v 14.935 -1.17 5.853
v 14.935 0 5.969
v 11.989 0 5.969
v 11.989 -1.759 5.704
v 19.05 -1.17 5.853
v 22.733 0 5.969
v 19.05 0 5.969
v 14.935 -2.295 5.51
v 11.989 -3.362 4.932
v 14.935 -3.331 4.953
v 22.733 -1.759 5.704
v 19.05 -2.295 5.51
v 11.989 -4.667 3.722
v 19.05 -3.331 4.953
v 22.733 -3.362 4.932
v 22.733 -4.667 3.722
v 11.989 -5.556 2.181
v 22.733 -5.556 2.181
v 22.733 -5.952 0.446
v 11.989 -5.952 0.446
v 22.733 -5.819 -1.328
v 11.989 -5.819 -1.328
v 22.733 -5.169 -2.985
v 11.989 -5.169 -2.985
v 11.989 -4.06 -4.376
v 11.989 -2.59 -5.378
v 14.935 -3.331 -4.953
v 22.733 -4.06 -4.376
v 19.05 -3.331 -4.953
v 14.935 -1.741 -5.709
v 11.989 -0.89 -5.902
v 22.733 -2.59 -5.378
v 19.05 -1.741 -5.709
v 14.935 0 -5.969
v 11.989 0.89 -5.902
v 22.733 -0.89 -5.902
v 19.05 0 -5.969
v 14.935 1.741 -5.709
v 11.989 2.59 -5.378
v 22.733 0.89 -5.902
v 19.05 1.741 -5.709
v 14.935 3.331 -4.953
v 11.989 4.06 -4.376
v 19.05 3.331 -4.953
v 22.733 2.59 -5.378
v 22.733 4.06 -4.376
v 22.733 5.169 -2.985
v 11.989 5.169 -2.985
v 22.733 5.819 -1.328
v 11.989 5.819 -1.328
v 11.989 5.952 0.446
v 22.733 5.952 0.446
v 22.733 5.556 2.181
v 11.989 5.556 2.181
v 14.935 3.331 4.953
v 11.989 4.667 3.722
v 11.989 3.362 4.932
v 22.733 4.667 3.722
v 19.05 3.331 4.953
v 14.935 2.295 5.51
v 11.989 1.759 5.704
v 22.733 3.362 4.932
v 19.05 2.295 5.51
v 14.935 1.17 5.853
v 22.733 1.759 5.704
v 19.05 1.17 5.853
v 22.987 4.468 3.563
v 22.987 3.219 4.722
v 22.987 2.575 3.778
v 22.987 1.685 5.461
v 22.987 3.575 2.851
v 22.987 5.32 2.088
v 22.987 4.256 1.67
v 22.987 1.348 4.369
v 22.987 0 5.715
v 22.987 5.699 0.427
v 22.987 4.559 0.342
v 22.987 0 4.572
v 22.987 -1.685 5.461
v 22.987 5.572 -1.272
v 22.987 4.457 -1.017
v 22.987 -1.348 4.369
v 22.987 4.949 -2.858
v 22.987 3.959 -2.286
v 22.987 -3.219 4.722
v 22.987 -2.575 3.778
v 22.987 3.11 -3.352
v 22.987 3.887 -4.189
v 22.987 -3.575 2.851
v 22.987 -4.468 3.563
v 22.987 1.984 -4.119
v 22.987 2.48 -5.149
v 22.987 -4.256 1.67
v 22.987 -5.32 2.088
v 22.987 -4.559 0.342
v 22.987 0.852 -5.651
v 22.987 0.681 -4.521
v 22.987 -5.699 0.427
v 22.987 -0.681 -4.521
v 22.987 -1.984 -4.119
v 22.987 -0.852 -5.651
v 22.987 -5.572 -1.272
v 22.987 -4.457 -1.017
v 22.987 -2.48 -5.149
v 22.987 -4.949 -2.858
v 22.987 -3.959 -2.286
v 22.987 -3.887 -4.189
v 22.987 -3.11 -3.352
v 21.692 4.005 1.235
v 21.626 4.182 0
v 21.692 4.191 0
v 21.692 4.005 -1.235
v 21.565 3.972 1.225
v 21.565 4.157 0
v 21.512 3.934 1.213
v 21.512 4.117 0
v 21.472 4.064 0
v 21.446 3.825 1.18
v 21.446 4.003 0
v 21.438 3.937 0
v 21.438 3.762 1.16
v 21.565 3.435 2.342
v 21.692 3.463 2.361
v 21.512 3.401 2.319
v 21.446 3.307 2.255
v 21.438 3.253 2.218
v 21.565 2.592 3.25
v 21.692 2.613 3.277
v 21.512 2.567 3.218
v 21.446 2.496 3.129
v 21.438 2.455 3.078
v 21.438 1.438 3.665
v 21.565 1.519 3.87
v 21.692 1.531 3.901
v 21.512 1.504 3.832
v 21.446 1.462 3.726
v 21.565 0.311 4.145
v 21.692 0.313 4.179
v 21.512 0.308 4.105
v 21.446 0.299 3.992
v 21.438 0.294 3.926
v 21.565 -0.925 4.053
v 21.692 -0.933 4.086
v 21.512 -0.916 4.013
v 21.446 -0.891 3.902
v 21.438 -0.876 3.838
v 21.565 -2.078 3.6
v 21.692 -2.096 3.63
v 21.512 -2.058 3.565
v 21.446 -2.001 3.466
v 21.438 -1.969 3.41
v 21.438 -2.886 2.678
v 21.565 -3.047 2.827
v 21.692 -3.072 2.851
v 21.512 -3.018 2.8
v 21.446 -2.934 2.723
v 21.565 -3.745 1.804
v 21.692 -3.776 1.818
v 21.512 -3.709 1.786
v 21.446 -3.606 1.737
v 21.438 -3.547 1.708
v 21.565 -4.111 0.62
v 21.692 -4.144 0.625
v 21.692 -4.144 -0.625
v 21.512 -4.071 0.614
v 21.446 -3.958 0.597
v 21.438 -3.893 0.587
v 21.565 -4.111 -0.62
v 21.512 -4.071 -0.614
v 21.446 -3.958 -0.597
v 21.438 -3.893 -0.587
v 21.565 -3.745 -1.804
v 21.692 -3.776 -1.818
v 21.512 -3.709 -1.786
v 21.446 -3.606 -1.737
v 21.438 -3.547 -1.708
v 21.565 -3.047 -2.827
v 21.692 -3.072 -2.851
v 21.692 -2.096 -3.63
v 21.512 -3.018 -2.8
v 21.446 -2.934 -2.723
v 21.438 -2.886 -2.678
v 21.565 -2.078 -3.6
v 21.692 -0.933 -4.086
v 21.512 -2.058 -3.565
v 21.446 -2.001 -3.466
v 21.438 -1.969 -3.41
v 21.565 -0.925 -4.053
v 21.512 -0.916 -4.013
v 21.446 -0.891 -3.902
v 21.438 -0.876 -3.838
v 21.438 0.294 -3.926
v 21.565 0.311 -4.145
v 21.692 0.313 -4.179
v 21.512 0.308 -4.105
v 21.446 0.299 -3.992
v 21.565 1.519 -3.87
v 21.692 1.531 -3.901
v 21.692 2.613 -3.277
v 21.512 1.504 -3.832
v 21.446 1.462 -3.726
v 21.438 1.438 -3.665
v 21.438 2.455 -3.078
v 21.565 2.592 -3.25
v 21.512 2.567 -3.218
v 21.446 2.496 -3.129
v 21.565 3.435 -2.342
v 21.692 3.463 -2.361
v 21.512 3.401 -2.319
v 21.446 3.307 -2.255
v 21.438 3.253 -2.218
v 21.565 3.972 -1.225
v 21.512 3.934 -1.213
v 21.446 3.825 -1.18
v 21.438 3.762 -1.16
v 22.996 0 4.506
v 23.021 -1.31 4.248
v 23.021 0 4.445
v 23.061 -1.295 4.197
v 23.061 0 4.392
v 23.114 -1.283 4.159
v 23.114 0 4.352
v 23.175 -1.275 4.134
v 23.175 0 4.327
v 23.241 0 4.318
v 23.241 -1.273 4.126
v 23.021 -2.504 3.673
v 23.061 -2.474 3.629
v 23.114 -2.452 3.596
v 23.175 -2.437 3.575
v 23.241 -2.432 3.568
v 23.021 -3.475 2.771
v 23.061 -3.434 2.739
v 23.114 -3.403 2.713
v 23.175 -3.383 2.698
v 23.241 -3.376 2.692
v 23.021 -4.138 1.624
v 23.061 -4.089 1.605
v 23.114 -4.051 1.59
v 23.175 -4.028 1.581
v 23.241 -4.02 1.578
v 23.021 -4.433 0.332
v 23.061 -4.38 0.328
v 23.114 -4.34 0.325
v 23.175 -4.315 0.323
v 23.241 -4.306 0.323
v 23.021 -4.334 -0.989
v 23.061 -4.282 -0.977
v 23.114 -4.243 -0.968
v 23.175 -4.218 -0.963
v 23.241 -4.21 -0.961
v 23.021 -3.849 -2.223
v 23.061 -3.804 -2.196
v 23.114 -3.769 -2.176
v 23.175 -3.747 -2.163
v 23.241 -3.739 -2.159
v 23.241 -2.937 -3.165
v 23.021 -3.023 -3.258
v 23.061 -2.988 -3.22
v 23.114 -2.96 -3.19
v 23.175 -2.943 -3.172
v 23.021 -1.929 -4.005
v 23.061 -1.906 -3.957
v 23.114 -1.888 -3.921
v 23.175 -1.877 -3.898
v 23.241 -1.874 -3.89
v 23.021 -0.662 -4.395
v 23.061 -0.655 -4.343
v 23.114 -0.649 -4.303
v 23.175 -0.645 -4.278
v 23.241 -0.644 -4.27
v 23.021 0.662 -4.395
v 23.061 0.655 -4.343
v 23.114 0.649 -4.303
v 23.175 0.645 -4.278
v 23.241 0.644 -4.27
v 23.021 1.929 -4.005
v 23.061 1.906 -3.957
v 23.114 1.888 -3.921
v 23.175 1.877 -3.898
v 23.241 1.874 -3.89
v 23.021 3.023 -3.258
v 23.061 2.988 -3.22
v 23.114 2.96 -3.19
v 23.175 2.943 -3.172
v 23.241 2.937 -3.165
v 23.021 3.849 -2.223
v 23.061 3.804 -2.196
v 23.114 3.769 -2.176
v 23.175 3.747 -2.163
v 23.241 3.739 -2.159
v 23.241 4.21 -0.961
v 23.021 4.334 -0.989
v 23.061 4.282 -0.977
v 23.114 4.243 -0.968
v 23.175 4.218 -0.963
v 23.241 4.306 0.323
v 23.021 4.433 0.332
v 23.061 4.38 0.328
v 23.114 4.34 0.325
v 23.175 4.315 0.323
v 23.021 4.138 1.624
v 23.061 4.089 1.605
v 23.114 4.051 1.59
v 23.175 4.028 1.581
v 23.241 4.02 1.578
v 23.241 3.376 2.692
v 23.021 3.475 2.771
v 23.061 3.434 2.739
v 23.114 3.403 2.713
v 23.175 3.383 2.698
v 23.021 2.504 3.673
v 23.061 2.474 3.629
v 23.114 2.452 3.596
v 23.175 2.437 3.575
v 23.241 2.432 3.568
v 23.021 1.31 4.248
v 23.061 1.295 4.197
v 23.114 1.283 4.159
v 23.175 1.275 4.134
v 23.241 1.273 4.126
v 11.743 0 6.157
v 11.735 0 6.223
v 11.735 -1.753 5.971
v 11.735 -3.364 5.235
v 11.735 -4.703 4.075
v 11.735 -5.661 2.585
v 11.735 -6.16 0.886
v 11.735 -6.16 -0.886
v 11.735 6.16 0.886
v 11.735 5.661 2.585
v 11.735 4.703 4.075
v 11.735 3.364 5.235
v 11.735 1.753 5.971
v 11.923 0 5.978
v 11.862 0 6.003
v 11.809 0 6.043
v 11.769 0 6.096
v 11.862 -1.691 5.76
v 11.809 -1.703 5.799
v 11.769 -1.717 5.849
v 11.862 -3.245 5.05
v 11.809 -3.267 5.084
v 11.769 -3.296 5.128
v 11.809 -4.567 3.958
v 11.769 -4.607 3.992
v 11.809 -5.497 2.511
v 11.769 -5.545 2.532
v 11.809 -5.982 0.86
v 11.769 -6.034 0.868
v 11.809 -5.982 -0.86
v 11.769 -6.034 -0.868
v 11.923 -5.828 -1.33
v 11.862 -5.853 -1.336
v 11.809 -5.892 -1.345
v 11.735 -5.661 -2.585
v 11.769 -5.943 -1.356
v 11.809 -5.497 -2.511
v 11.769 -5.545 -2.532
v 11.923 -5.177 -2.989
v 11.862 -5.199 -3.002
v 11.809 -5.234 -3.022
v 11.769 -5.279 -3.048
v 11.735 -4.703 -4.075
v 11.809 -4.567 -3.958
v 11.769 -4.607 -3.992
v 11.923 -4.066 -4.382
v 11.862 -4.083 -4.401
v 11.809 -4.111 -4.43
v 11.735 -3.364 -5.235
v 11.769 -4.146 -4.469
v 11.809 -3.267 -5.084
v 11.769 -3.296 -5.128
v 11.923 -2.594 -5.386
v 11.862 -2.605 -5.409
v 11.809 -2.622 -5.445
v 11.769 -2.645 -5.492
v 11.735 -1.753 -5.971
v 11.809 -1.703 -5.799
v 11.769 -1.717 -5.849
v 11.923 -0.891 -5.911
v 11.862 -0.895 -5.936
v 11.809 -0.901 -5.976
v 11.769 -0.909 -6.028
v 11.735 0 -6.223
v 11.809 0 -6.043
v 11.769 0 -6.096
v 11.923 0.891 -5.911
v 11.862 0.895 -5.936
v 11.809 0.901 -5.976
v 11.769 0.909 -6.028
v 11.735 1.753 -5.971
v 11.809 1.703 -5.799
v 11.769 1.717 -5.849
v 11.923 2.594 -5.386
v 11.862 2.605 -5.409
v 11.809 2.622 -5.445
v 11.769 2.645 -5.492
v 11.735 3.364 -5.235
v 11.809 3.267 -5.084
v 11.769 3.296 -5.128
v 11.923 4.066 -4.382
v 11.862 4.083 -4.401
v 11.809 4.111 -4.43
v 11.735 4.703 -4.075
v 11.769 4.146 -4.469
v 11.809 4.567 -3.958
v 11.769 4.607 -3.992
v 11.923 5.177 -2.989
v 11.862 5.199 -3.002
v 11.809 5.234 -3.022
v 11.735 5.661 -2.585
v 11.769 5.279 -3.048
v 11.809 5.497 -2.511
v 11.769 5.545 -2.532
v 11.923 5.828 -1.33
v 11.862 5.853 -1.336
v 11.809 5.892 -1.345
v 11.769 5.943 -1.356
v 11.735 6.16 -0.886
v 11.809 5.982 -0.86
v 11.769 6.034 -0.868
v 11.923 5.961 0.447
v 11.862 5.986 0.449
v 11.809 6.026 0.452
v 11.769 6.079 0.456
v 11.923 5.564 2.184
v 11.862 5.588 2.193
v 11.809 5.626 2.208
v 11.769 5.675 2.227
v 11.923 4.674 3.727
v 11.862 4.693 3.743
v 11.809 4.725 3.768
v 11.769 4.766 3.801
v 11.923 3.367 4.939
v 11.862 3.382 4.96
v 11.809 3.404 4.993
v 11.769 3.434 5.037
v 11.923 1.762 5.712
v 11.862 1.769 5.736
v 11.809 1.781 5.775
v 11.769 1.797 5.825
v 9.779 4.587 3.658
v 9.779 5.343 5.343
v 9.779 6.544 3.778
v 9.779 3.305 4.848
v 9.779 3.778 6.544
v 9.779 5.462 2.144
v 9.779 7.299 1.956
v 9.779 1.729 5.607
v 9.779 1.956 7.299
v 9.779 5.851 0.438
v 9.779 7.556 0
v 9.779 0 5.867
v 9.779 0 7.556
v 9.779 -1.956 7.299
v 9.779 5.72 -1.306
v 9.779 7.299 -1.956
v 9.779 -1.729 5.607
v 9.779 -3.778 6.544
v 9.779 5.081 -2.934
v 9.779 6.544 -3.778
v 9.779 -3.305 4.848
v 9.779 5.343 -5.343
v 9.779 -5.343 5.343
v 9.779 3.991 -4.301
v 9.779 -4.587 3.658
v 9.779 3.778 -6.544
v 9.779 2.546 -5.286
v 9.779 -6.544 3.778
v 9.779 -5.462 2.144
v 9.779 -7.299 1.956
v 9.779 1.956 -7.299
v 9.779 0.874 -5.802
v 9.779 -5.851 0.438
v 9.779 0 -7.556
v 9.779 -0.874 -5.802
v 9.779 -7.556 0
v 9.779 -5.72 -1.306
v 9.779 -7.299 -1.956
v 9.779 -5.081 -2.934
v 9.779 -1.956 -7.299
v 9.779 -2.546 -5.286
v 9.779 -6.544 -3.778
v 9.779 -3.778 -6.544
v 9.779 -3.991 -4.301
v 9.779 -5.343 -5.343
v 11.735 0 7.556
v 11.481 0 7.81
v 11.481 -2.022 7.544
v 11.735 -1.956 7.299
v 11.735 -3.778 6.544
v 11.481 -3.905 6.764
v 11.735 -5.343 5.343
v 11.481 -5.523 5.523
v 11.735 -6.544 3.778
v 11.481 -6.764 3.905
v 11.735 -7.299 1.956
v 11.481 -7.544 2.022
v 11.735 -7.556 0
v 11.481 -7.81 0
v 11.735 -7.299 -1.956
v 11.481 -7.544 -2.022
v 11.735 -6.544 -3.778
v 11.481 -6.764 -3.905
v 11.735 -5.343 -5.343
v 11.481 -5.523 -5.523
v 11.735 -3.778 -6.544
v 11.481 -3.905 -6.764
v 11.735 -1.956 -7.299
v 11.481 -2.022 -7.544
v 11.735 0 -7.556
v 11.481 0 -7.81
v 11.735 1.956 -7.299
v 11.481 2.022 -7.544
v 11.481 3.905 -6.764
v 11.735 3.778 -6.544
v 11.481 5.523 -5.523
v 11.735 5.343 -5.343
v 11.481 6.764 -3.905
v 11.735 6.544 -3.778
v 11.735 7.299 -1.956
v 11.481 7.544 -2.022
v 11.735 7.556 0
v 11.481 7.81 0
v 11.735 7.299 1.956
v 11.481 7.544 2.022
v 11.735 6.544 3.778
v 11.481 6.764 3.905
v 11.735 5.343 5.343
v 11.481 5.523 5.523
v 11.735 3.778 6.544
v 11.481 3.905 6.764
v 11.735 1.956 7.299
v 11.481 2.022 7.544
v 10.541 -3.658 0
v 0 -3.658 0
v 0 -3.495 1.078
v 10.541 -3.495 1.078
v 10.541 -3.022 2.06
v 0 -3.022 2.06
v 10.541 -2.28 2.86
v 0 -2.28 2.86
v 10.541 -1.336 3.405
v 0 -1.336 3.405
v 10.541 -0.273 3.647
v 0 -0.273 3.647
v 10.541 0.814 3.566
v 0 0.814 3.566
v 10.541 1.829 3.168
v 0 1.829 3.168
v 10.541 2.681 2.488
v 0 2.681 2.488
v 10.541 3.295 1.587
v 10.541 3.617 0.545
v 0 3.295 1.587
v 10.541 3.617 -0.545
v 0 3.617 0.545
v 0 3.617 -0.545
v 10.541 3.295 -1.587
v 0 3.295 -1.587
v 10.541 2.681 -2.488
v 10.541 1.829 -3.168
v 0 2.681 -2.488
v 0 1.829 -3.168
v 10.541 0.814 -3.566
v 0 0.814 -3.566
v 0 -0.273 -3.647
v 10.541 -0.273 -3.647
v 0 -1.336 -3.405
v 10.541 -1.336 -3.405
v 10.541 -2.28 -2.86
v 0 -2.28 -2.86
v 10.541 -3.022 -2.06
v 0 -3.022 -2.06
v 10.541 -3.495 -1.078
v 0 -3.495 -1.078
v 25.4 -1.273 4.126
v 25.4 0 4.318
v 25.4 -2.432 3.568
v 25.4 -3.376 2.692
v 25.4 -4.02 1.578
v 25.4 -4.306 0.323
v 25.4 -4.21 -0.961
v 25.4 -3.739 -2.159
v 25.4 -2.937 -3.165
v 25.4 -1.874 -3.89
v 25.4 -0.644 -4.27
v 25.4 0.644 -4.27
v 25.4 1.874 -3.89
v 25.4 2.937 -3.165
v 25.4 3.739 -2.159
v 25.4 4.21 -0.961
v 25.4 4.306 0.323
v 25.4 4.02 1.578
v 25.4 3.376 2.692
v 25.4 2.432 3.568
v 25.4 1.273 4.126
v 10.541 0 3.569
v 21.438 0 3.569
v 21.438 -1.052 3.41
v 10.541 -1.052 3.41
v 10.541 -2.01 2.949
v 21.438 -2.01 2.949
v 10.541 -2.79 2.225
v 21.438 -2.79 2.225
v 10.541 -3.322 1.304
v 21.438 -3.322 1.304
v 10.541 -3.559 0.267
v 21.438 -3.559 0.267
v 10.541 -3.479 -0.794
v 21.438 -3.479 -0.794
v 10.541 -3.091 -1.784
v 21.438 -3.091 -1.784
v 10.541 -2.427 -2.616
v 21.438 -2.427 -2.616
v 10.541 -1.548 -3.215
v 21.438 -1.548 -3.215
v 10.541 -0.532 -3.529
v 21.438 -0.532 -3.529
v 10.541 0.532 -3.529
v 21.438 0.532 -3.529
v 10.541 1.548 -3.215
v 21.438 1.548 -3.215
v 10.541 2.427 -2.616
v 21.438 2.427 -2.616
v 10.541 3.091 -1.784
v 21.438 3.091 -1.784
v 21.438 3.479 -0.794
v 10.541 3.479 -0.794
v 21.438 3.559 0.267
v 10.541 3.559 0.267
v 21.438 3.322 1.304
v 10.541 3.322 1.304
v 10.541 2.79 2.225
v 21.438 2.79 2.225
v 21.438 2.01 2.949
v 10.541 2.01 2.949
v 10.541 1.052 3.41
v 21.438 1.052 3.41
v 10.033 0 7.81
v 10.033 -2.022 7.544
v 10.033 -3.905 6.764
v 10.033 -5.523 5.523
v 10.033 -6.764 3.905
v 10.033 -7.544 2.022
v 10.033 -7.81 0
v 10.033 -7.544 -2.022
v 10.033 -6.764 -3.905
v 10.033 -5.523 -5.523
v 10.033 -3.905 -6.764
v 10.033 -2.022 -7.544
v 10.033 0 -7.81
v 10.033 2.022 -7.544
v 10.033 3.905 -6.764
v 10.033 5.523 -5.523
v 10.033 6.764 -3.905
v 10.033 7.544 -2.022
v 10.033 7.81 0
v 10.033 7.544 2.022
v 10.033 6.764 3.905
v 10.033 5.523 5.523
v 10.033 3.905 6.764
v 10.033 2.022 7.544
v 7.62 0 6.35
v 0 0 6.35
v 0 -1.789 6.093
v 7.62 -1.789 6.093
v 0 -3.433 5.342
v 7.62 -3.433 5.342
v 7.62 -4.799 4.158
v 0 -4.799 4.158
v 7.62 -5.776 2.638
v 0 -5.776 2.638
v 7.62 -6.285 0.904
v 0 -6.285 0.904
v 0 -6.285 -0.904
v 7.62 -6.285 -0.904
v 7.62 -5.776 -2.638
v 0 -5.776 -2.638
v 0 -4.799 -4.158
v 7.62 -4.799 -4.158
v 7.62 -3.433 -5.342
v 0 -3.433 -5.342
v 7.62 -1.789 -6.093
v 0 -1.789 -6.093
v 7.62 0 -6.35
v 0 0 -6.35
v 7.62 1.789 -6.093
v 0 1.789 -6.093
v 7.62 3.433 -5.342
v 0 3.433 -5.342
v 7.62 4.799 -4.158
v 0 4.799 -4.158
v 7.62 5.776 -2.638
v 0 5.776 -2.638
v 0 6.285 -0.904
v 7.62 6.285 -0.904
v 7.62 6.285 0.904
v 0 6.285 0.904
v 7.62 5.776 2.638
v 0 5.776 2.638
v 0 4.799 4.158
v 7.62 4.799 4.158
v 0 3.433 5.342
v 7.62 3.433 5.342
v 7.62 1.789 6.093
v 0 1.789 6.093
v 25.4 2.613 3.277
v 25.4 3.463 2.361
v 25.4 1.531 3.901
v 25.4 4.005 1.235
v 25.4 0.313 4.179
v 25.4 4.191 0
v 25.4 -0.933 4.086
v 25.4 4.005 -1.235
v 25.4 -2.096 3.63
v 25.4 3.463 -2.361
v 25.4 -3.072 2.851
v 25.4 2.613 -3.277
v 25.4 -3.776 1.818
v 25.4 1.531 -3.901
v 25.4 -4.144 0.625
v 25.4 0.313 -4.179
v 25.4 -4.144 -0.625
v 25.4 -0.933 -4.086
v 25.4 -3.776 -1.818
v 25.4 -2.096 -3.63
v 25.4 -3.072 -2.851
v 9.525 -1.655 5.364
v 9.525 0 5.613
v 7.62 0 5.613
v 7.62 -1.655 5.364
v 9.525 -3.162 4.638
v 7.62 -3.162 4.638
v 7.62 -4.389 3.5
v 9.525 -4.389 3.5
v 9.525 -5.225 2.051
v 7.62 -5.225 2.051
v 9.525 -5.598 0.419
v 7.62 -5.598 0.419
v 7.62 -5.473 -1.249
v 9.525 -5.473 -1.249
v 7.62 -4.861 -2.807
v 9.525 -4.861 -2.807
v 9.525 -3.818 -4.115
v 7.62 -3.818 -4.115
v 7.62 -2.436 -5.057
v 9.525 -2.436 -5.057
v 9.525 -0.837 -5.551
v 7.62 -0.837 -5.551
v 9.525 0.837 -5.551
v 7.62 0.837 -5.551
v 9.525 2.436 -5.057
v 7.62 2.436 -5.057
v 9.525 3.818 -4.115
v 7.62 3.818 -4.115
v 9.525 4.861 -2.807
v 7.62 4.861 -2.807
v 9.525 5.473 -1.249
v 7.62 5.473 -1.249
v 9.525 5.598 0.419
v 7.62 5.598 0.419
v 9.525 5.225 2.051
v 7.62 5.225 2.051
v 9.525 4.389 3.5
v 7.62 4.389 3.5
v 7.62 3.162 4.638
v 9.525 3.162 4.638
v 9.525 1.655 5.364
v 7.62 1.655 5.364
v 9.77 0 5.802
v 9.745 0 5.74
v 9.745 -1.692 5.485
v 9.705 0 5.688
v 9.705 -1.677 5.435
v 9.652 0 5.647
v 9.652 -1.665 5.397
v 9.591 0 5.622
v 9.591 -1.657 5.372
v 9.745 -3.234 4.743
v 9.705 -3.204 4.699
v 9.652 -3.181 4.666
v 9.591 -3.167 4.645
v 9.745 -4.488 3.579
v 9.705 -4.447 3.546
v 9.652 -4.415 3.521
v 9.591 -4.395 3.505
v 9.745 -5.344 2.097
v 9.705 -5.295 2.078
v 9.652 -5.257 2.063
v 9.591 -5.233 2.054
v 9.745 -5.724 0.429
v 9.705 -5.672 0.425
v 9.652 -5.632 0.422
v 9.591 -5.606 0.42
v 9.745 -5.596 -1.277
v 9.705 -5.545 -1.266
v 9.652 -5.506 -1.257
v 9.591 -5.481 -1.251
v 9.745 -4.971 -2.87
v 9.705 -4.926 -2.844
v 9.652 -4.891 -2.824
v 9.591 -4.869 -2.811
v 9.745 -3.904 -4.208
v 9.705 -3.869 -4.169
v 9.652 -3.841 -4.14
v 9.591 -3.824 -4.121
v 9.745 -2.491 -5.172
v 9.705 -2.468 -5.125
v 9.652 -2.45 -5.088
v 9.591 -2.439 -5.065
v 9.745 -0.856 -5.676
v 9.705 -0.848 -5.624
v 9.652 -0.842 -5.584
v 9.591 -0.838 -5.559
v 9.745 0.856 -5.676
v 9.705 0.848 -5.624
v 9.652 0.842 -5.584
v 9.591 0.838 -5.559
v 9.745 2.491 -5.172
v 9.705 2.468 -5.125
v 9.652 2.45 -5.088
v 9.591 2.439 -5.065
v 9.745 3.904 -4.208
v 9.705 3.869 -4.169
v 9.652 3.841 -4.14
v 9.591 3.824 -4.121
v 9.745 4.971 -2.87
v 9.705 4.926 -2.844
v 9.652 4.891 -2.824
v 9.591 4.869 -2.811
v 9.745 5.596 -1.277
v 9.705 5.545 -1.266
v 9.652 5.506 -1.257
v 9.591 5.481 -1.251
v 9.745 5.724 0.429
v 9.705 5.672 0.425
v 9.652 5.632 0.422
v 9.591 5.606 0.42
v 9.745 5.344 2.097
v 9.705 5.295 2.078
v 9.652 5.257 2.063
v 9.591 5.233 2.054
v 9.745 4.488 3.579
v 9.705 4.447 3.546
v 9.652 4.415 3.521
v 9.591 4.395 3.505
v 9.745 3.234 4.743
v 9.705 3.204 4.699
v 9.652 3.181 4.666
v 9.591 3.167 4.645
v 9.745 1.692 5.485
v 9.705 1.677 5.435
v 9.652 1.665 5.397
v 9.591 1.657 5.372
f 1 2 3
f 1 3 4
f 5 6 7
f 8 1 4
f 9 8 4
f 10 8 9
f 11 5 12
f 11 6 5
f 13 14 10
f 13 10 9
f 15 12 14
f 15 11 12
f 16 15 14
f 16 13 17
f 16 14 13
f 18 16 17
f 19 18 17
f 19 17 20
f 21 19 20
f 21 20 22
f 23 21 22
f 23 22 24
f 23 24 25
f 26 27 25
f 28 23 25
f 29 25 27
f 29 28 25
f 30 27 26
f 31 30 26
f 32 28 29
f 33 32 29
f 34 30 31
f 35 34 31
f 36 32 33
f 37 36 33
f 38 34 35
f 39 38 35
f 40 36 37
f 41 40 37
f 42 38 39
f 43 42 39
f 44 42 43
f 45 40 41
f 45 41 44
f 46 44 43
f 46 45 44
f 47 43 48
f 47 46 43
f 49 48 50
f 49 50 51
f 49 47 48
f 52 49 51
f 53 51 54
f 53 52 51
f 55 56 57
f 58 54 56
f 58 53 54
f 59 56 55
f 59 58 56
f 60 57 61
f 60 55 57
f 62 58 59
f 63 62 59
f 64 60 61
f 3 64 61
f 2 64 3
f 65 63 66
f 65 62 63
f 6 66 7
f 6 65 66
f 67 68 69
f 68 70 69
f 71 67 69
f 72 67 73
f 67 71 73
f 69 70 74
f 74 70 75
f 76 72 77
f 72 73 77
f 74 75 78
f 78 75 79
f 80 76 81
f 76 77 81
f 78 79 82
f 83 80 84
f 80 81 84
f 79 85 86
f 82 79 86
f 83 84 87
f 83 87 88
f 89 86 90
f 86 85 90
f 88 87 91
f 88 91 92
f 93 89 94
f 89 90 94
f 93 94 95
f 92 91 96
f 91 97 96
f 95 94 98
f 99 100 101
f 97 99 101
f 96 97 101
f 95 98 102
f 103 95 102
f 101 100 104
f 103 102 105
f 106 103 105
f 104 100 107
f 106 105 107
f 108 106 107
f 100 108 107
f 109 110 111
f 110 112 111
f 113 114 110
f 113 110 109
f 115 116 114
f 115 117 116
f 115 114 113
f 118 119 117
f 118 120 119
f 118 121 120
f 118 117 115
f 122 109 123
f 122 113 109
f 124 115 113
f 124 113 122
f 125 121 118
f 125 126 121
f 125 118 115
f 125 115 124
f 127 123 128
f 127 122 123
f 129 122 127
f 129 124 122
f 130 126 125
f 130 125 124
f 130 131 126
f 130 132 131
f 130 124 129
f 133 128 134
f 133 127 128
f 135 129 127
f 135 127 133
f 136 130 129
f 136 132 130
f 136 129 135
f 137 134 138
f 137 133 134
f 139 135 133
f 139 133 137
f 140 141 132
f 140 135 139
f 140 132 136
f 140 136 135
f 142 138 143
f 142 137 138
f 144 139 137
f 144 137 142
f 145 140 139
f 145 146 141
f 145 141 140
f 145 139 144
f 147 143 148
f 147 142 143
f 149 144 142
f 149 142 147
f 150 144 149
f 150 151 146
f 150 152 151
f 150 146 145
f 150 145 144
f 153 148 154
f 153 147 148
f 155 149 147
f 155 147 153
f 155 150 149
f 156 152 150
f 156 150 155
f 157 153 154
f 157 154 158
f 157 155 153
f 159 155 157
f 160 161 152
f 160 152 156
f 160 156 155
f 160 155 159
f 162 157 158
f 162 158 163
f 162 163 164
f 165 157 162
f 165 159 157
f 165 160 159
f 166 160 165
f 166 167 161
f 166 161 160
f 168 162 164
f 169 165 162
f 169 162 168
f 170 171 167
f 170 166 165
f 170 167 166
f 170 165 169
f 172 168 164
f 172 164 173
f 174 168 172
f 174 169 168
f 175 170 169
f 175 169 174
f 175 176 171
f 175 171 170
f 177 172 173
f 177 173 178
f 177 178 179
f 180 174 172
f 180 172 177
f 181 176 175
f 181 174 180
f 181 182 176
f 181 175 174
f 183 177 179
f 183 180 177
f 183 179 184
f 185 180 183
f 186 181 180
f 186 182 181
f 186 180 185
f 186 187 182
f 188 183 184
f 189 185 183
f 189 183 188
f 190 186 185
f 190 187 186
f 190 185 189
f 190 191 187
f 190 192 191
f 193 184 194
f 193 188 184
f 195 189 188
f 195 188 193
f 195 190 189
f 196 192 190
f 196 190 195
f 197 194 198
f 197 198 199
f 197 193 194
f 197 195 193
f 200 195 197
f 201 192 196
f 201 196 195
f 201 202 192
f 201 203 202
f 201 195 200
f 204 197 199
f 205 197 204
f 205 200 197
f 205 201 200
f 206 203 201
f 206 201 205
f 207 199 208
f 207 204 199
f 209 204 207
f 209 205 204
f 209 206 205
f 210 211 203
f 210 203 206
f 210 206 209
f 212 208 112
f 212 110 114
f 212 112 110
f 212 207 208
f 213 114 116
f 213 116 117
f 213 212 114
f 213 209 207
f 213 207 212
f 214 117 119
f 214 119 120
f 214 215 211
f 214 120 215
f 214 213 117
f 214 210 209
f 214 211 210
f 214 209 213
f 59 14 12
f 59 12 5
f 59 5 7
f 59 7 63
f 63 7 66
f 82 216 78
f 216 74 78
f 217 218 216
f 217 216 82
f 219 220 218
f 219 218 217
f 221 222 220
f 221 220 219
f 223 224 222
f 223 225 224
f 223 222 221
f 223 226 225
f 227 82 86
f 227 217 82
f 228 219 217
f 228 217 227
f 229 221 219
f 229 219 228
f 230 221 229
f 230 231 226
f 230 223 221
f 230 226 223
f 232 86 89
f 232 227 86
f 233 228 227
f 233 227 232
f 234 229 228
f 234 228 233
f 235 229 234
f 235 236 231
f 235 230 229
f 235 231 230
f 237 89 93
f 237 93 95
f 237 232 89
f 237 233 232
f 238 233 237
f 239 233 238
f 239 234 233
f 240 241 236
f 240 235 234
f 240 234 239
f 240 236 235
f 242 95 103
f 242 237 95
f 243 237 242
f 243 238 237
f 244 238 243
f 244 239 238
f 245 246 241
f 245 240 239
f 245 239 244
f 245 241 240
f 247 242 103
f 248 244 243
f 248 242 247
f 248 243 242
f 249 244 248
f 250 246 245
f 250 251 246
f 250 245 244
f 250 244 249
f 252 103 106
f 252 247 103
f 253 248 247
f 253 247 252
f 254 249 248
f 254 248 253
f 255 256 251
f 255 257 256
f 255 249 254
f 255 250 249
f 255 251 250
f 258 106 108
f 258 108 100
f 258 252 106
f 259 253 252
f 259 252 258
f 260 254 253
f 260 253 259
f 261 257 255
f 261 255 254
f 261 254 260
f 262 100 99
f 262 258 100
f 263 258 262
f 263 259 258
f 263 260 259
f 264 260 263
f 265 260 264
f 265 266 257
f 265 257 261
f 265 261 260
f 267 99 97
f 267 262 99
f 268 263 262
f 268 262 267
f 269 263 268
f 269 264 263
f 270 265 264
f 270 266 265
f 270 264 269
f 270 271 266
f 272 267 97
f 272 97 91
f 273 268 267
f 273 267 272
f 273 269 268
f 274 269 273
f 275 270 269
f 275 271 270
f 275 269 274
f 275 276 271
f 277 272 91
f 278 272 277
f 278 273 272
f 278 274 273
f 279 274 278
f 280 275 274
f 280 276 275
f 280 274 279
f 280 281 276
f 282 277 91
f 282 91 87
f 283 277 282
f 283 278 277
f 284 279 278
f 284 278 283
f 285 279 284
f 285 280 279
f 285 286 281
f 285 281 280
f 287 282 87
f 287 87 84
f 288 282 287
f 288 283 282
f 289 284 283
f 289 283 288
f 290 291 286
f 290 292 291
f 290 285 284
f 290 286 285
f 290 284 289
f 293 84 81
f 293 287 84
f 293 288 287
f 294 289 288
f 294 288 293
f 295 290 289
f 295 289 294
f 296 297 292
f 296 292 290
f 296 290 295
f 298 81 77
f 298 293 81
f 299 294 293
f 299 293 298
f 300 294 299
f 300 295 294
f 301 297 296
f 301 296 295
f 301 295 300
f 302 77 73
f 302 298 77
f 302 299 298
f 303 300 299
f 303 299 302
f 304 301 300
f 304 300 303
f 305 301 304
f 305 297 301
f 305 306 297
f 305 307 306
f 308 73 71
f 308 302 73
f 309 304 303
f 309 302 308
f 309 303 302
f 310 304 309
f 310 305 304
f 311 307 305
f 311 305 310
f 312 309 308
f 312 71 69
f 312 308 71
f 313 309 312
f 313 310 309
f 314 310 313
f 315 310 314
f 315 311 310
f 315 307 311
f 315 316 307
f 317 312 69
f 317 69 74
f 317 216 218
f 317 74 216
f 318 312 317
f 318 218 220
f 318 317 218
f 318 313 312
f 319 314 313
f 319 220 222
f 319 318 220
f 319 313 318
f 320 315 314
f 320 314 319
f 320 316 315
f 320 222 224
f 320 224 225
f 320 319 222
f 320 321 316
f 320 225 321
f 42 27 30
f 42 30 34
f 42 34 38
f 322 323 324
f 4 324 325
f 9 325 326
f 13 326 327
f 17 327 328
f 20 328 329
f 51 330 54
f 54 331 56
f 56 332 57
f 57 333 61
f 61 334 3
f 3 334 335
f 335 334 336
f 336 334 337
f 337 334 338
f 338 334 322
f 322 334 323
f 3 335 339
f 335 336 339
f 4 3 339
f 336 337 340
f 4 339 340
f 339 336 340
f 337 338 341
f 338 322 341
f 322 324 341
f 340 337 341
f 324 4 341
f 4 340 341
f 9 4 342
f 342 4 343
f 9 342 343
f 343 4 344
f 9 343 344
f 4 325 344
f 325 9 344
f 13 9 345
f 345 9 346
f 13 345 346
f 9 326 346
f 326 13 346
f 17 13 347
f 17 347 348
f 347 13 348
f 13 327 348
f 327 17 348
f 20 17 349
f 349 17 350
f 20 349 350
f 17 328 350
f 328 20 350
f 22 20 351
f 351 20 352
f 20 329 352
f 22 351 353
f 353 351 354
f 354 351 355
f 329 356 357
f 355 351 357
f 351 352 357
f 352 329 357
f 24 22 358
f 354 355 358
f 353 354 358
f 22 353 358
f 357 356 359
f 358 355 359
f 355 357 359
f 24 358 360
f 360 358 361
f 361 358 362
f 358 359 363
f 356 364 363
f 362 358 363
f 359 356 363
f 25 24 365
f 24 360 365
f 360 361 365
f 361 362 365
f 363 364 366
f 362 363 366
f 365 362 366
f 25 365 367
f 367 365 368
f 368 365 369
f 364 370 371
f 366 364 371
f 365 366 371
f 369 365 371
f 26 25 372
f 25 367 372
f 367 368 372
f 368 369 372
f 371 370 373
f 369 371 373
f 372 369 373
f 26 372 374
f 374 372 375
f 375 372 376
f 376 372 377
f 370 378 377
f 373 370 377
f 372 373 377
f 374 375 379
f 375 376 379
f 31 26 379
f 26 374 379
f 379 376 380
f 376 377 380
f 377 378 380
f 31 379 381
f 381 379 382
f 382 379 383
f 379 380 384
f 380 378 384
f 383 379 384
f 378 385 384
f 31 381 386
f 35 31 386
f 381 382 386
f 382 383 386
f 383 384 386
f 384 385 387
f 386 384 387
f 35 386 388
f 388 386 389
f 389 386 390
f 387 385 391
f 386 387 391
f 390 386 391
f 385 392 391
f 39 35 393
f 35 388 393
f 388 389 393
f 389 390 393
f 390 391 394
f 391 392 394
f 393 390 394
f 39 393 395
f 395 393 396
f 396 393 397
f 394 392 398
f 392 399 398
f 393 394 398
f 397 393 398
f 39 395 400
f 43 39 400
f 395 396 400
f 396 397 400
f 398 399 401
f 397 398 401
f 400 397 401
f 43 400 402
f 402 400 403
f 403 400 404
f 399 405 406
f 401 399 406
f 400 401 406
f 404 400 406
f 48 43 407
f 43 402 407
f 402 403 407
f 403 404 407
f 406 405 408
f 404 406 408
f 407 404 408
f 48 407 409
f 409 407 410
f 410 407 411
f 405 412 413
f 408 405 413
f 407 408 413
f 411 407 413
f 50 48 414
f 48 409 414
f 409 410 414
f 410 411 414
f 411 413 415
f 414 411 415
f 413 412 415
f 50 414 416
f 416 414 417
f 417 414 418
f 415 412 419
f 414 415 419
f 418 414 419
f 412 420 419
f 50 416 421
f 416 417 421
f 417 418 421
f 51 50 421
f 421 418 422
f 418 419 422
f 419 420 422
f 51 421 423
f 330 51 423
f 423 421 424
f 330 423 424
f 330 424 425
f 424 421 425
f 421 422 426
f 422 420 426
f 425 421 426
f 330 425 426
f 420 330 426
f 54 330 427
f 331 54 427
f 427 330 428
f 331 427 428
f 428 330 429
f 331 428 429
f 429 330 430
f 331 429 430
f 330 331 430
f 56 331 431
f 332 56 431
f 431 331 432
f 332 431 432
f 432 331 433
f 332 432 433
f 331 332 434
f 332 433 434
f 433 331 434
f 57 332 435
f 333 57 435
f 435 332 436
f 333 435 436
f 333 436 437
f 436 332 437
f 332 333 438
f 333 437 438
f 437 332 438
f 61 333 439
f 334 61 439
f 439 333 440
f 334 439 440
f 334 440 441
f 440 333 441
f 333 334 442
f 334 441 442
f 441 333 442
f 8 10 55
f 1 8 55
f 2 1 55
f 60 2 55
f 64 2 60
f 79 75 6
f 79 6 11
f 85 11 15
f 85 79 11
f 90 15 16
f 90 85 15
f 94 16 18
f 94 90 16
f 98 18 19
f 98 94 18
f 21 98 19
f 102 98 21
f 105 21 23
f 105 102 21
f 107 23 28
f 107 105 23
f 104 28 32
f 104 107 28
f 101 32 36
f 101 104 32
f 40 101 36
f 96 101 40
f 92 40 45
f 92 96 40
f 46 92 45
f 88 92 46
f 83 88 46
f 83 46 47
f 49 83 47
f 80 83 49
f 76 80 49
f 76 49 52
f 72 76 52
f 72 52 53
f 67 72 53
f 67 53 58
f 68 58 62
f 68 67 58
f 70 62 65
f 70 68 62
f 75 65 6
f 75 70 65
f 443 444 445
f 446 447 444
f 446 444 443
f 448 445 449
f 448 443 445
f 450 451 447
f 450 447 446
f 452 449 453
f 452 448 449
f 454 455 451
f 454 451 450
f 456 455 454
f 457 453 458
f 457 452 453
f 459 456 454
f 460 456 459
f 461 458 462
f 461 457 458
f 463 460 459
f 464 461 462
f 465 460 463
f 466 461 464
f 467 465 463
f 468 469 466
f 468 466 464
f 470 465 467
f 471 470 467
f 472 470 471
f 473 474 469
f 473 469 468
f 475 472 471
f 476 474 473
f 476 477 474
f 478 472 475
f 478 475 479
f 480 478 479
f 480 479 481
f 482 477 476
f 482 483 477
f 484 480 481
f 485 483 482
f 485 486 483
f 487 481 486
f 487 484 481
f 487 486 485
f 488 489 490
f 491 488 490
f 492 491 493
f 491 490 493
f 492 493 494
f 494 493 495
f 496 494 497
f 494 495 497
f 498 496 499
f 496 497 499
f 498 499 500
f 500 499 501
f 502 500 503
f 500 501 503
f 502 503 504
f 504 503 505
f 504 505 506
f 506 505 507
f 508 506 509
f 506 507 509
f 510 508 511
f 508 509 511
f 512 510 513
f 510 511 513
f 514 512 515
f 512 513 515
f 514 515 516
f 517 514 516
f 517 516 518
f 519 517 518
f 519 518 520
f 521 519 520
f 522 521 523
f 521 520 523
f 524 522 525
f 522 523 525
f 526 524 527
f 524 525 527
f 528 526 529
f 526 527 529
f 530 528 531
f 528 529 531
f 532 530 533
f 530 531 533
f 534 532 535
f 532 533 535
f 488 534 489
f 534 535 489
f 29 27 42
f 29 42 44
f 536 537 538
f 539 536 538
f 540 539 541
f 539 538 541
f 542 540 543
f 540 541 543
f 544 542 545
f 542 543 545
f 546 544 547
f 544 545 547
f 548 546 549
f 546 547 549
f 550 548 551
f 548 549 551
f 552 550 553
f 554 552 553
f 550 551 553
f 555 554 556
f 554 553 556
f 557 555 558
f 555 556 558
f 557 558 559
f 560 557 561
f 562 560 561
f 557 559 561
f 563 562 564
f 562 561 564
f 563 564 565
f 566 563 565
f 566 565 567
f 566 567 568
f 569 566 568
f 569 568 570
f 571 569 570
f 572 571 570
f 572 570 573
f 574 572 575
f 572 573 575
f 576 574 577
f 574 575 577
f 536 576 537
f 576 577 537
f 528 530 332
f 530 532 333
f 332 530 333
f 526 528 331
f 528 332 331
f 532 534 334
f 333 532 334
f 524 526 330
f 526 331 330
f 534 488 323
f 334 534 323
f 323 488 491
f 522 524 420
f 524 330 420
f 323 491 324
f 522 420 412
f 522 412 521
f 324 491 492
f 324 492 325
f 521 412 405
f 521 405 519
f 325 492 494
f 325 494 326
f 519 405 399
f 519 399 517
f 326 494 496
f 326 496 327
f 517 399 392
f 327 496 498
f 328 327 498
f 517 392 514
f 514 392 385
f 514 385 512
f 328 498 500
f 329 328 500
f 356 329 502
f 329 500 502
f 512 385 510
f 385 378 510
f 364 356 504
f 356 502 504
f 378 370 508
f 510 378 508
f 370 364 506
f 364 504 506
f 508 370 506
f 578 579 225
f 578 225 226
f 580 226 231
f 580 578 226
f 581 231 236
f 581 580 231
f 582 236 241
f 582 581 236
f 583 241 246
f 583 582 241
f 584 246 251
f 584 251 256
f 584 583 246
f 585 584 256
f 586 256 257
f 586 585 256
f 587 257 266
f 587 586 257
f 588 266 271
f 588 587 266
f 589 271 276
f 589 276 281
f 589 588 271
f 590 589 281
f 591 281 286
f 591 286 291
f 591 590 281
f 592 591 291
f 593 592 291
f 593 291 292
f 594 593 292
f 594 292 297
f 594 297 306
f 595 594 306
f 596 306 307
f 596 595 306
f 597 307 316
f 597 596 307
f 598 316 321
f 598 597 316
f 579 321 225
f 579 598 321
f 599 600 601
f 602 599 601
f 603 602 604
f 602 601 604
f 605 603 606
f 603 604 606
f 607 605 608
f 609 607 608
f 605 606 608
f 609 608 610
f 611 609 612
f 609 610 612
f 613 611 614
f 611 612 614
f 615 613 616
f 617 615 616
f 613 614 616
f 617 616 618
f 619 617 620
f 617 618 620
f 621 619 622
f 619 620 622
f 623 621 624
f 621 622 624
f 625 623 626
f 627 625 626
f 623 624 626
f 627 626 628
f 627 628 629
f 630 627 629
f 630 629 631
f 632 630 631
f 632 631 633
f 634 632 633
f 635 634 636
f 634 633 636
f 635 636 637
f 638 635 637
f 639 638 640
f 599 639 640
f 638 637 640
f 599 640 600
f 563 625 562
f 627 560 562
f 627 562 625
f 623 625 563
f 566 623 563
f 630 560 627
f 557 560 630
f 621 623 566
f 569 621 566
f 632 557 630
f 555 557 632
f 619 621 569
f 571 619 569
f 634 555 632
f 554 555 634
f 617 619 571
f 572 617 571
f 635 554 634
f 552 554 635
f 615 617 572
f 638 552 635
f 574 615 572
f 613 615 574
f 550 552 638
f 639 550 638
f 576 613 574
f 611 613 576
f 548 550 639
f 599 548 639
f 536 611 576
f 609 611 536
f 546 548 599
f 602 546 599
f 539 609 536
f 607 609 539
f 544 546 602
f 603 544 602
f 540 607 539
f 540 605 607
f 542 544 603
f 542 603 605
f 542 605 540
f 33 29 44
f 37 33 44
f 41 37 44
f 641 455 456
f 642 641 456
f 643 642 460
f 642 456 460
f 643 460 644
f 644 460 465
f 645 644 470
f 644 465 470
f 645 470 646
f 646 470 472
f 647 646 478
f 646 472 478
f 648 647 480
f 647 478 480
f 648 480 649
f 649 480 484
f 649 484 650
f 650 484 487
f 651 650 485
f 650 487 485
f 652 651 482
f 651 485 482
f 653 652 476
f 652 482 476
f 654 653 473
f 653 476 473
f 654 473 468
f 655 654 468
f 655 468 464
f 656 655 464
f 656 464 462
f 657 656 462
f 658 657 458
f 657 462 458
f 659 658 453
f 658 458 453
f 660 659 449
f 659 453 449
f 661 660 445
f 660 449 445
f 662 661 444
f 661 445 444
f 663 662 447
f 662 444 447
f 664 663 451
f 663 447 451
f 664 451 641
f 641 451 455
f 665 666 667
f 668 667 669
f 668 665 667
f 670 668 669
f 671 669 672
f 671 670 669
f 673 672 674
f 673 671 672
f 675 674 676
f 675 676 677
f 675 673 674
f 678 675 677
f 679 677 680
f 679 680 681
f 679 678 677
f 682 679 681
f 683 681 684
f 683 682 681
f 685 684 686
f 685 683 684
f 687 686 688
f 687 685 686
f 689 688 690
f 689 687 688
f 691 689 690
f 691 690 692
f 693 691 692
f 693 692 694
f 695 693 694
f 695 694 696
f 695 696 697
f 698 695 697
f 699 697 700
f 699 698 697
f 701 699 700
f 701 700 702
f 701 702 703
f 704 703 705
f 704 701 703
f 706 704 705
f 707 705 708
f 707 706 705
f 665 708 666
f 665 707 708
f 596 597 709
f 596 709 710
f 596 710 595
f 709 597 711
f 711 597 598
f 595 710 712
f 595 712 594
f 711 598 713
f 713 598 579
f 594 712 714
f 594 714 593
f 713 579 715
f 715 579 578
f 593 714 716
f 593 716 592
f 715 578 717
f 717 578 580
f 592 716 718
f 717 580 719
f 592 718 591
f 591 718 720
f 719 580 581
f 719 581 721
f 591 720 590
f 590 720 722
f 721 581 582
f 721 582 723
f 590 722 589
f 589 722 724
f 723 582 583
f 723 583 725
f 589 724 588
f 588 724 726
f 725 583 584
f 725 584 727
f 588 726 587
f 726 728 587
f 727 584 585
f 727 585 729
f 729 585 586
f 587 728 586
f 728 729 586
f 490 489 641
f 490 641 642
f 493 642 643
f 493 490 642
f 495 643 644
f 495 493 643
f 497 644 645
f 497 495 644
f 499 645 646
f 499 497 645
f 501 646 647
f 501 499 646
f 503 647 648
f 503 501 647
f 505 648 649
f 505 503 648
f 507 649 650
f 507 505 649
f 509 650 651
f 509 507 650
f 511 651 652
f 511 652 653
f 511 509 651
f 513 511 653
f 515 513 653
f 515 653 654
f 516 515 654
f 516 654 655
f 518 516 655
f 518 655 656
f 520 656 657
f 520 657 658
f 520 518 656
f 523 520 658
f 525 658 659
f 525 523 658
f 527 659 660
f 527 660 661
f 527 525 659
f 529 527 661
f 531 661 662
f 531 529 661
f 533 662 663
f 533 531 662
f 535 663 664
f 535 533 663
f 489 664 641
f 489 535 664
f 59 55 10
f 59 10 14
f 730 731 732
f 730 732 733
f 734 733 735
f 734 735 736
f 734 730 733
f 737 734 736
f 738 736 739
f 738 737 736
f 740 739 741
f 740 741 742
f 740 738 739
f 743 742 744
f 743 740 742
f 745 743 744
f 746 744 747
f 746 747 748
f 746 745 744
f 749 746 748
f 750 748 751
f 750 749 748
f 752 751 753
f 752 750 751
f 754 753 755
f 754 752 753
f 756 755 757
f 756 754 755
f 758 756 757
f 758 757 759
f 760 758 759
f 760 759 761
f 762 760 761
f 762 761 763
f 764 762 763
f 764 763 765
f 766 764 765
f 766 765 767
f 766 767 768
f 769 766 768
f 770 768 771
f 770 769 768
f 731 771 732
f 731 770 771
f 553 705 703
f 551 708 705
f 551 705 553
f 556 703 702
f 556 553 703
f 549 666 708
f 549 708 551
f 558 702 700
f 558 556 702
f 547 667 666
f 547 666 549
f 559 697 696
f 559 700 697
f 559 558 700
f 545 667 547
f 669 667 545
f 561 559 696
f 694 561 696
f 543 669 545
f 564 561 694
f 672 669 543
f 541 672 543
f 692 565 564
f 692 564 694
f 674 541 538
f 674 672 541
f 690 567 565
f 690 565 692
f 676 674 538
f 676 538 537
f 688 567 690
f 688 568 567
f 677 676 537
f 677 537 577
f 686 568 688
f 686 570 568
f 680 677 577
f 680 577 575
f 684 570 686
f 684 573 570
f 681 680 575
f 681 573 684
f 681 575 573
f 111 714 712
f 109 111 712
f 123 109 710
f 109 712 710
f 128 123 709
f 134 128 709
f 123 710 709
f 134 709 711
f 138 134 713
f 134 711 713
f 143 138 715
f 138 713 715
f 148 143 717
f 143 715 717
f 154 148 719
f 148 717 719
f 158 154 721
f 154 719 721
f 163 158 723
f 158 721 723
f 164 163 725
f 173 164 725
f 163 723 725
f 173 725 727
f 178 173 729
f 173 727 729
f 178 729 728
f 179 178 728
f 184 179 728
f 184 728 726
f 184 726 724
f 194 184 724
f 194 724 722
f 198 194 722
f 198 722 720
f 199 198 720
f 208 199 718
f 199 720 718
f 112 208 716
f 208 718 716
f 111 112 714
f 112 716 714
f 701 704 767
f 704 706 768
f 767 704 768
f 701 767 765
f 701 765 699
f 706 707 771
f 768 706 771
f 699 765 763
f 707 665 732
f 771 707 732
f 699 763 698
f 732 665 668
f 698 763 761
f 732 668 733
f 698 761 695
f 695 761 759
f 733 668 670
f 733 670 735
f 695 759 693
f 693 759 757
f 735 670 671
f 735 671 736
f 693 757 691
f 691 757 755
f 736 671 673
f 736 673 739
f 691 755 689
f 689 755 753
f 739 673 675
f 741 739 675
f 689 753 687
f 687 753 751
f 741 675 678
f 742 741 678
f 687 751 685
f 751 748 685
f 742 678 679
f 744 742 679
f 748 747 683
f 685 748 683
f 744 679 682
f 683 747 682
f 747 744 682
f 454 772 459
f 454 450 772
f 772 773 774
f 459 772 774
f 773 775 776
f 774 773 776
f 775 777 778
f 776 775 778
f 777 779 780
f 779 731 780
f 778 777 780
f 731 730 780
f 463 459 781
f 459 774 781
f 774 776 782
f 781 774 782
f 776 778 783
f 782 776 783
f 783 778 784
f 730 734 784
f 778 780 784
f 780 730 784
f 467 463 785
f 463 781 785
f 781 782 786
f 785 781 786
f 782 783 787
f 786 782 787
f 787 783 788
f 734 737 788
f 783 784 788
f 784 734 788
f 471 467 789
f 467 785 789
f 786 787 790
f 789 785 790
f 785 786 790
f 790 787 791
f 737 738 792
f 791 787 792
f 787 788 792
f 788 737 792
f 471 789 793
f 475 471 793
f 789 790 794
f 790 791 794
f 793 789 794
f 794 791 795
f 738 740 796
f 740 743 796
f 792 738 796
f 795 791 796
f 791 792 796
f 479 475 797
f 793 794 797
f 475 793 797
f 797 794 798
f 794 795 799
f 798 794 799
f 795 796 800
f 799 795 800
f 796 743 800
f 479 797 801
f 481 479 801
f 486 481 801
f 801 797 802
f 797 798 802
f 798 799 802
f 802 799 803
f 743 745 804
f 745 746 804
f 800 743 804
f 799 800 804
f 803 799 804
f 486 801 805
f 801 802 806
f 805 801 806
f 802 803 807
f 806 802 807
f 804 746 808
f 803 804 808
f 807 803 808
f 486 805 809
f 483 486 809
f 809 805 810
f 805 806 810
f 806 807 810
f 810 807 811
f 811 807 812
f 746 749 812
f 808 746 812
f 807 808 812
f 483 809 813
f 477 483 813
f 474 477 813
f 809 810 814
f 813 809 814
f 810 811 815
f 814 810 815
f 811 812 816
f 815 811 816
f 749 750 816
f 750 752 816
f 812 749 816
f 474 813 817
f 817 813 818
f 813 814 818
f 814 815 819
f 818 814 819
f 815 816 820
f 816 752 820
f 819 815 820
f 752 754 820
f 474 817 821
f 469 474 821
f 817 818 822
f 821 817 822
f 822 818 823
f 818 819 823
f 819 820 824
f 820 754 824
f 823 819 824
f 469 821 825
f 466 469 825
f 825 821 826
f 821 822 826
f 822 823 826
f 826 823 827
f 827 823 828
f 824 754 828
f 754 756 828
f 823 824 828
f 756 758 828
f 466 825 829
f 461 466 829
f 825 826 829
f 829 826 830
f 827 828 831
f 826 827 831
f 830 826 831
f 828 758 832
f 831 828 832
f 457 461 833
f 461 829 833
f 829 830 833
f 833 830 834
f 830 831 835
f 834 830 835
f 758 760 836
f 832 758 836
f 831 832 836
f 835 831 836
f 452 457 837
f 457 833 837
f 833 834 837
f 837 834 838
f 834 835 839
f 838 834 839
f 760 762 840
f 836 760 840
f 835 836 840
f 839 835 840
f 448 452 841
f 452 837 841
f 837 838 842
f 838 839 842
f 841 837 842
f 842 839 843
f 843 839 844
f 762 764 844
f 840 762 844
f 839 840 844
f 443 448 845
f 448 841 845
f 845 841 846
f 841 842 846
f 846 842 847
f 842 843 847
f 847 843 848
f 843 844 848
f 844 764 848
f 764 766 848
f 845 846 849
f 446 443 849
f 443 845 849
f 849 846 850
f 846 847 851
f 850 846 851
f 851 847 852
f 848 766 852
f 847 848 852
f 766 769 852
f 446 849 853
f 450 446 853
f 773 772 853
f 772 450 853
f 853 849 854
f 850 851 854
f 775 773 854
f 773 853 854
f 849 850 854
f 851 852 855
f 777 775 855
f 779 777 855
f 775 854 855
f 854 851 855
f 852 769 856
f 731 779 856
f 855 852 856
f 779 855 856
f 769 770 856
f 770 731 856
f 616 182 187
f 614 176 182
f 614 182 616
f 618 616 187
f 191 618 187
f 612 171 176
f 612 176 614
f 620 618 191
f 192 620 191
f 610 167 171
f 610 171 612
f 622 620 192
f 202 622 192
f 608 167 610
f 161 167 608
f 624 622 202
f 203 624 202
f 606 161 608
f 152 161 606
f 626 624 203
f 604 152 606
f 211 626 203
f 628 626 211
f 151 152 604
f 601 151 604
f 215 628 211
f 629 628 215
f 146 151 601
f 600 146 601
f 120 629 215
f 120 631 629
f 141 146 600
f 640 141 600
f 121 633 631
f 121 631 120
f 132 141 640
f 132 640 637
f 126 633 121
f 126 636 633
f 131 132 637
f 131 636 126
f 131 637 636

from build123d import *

# Parameters (mm, degrees)
F0_W           = 25.4
F0_H           = 2.7813
F2_W           = 1.9558
F2_H           = 1.4605
F4_W           = 13.6652
F4_H           = 2.921
F6_W           = 2.159
F6_H           = 3.2766
F6_W_2         = 2.413
F6_H_2         = 4.572
F8_R           = 3.6576
F9_DEPTH       = 10.541
F10_R          = 4.191
F11_DEPTH      = 3.9624
F12_W          = 4.1148
F12_H          = 3.937
F13_DEPTH      = 7.8115
F13_DEPTH_BACK = 7.8115
F14_SIZE       = 0.254
F15_SIZE       = 0.254
F16_R          = 0.254


# Not quite as in the source:
# - a feature of the source that left no trace in its solid (it failed there, or was rolled back) is left out


with BuildPart() as f1:
    # F0 (on Front) → F1 (revolve)
    with BuildSketch(Plane.XZ):
        with Locations((12.7, 4.95935)):
            Rectangle(F0_W, F0_H)
    revolve(axis=Axis((6.9021734883, 0, 0), (1, 0, 0)))

    # F2 (on Front) → F3 (revolve)
    with BuildSketch(Plane.XZ):
        with Locations((10.7569, 7.08025)):
            Rectangle(F2_W, F2_H)
    revolve(axis=Axis((12.3426117934, 0, 0), (1, 0, 0)))

    # F4 (on Front) → F5 (revolve, cut)
    with BuildSketch(Plane.XZ):
        with Locations((18.5674, 7.4295)):
            Rectangle(F4_W, F4_H)
    revolve(axis=Axis((16.2136404502, 0, 0), (1, 0, 0)), mode=Mode.SUBTRACT)

    # F6 (on Front) → F7 (revolve, cut)
    with BuildSketch(Plane.XZ):
        with Locations((8.6995, 7.2517)):
            Rectangle(F6_W, F6_H)
        with Locations((24.1935, 6.604)):
            Rectangle(F6_W_2, F6_H_2)
    revolve(axis=Axis((7.4812129023, 0, 0), (1, 0, 0)), mode=Mode.SUBTRACT)

    # F8 (on face) → F9 (cut)
    with BuildSketch(Plane(origin=(0, 0, 0), x_dir=(0, -1, 0), z_dir=(-1, 0, 0))):
        Circle(F8_R)
    extrude(amount=-F9_DEPTH, mode=Mode.SUBTRACT)

    # F10 (on face) → F11 (cut)
    with BuildSketch(Plane.YZ.offset(25.4)):
        Circle(F10_R)
    extrude(amount=-F11_DEPTH, mode=Mode.SUBTRACT)

    # F12 (on Front) → F13 (cut, two sides)
    with BuildSketch(Plane.XZ) as f13_sk:
        with Locations((16.9926, 6.9215)):
            Rectangle(F12_W, F12_H)
        with Locations((16.9926, -6.9215)):
            Rectangle(F12_W, F12_H)
    extrude(amount=-F13_DEPTH, mode=Mode.SUBTRACT)
    extrude(f13_sk.sketch, amount=F13_DEPTH_BACK, mode=Mode.SUBTRACT)

    # F14
    f14_edges = [f1.edges().sort_by_distance(p)[0] for p in [
        (9.779, 0, -7.8105),
        (11.7348, 0, -7.8105),
    ]]
    chamfer(f14_edges, length=F14_SIZE)

    # F15
    f15_edges = [f1.edges().sort_by_distance(p)[0] for p in [
        (22.987, 0, -5.969),
    ]]
    chamfer(f15_edges, length=F15_SIZE)

    # F16
    f16_edges = [f1.edges().sort_by_distance(p)[0] for p in [
        (9.779, 0, -5.6134),
        (11.7348, 0, -5.969),
        (22.987, 0, -4.318),
        (21.4376, -4.191, 0),
    ]]
    fillet(f16_edges, radius=F16_R)


solid = f1.part
